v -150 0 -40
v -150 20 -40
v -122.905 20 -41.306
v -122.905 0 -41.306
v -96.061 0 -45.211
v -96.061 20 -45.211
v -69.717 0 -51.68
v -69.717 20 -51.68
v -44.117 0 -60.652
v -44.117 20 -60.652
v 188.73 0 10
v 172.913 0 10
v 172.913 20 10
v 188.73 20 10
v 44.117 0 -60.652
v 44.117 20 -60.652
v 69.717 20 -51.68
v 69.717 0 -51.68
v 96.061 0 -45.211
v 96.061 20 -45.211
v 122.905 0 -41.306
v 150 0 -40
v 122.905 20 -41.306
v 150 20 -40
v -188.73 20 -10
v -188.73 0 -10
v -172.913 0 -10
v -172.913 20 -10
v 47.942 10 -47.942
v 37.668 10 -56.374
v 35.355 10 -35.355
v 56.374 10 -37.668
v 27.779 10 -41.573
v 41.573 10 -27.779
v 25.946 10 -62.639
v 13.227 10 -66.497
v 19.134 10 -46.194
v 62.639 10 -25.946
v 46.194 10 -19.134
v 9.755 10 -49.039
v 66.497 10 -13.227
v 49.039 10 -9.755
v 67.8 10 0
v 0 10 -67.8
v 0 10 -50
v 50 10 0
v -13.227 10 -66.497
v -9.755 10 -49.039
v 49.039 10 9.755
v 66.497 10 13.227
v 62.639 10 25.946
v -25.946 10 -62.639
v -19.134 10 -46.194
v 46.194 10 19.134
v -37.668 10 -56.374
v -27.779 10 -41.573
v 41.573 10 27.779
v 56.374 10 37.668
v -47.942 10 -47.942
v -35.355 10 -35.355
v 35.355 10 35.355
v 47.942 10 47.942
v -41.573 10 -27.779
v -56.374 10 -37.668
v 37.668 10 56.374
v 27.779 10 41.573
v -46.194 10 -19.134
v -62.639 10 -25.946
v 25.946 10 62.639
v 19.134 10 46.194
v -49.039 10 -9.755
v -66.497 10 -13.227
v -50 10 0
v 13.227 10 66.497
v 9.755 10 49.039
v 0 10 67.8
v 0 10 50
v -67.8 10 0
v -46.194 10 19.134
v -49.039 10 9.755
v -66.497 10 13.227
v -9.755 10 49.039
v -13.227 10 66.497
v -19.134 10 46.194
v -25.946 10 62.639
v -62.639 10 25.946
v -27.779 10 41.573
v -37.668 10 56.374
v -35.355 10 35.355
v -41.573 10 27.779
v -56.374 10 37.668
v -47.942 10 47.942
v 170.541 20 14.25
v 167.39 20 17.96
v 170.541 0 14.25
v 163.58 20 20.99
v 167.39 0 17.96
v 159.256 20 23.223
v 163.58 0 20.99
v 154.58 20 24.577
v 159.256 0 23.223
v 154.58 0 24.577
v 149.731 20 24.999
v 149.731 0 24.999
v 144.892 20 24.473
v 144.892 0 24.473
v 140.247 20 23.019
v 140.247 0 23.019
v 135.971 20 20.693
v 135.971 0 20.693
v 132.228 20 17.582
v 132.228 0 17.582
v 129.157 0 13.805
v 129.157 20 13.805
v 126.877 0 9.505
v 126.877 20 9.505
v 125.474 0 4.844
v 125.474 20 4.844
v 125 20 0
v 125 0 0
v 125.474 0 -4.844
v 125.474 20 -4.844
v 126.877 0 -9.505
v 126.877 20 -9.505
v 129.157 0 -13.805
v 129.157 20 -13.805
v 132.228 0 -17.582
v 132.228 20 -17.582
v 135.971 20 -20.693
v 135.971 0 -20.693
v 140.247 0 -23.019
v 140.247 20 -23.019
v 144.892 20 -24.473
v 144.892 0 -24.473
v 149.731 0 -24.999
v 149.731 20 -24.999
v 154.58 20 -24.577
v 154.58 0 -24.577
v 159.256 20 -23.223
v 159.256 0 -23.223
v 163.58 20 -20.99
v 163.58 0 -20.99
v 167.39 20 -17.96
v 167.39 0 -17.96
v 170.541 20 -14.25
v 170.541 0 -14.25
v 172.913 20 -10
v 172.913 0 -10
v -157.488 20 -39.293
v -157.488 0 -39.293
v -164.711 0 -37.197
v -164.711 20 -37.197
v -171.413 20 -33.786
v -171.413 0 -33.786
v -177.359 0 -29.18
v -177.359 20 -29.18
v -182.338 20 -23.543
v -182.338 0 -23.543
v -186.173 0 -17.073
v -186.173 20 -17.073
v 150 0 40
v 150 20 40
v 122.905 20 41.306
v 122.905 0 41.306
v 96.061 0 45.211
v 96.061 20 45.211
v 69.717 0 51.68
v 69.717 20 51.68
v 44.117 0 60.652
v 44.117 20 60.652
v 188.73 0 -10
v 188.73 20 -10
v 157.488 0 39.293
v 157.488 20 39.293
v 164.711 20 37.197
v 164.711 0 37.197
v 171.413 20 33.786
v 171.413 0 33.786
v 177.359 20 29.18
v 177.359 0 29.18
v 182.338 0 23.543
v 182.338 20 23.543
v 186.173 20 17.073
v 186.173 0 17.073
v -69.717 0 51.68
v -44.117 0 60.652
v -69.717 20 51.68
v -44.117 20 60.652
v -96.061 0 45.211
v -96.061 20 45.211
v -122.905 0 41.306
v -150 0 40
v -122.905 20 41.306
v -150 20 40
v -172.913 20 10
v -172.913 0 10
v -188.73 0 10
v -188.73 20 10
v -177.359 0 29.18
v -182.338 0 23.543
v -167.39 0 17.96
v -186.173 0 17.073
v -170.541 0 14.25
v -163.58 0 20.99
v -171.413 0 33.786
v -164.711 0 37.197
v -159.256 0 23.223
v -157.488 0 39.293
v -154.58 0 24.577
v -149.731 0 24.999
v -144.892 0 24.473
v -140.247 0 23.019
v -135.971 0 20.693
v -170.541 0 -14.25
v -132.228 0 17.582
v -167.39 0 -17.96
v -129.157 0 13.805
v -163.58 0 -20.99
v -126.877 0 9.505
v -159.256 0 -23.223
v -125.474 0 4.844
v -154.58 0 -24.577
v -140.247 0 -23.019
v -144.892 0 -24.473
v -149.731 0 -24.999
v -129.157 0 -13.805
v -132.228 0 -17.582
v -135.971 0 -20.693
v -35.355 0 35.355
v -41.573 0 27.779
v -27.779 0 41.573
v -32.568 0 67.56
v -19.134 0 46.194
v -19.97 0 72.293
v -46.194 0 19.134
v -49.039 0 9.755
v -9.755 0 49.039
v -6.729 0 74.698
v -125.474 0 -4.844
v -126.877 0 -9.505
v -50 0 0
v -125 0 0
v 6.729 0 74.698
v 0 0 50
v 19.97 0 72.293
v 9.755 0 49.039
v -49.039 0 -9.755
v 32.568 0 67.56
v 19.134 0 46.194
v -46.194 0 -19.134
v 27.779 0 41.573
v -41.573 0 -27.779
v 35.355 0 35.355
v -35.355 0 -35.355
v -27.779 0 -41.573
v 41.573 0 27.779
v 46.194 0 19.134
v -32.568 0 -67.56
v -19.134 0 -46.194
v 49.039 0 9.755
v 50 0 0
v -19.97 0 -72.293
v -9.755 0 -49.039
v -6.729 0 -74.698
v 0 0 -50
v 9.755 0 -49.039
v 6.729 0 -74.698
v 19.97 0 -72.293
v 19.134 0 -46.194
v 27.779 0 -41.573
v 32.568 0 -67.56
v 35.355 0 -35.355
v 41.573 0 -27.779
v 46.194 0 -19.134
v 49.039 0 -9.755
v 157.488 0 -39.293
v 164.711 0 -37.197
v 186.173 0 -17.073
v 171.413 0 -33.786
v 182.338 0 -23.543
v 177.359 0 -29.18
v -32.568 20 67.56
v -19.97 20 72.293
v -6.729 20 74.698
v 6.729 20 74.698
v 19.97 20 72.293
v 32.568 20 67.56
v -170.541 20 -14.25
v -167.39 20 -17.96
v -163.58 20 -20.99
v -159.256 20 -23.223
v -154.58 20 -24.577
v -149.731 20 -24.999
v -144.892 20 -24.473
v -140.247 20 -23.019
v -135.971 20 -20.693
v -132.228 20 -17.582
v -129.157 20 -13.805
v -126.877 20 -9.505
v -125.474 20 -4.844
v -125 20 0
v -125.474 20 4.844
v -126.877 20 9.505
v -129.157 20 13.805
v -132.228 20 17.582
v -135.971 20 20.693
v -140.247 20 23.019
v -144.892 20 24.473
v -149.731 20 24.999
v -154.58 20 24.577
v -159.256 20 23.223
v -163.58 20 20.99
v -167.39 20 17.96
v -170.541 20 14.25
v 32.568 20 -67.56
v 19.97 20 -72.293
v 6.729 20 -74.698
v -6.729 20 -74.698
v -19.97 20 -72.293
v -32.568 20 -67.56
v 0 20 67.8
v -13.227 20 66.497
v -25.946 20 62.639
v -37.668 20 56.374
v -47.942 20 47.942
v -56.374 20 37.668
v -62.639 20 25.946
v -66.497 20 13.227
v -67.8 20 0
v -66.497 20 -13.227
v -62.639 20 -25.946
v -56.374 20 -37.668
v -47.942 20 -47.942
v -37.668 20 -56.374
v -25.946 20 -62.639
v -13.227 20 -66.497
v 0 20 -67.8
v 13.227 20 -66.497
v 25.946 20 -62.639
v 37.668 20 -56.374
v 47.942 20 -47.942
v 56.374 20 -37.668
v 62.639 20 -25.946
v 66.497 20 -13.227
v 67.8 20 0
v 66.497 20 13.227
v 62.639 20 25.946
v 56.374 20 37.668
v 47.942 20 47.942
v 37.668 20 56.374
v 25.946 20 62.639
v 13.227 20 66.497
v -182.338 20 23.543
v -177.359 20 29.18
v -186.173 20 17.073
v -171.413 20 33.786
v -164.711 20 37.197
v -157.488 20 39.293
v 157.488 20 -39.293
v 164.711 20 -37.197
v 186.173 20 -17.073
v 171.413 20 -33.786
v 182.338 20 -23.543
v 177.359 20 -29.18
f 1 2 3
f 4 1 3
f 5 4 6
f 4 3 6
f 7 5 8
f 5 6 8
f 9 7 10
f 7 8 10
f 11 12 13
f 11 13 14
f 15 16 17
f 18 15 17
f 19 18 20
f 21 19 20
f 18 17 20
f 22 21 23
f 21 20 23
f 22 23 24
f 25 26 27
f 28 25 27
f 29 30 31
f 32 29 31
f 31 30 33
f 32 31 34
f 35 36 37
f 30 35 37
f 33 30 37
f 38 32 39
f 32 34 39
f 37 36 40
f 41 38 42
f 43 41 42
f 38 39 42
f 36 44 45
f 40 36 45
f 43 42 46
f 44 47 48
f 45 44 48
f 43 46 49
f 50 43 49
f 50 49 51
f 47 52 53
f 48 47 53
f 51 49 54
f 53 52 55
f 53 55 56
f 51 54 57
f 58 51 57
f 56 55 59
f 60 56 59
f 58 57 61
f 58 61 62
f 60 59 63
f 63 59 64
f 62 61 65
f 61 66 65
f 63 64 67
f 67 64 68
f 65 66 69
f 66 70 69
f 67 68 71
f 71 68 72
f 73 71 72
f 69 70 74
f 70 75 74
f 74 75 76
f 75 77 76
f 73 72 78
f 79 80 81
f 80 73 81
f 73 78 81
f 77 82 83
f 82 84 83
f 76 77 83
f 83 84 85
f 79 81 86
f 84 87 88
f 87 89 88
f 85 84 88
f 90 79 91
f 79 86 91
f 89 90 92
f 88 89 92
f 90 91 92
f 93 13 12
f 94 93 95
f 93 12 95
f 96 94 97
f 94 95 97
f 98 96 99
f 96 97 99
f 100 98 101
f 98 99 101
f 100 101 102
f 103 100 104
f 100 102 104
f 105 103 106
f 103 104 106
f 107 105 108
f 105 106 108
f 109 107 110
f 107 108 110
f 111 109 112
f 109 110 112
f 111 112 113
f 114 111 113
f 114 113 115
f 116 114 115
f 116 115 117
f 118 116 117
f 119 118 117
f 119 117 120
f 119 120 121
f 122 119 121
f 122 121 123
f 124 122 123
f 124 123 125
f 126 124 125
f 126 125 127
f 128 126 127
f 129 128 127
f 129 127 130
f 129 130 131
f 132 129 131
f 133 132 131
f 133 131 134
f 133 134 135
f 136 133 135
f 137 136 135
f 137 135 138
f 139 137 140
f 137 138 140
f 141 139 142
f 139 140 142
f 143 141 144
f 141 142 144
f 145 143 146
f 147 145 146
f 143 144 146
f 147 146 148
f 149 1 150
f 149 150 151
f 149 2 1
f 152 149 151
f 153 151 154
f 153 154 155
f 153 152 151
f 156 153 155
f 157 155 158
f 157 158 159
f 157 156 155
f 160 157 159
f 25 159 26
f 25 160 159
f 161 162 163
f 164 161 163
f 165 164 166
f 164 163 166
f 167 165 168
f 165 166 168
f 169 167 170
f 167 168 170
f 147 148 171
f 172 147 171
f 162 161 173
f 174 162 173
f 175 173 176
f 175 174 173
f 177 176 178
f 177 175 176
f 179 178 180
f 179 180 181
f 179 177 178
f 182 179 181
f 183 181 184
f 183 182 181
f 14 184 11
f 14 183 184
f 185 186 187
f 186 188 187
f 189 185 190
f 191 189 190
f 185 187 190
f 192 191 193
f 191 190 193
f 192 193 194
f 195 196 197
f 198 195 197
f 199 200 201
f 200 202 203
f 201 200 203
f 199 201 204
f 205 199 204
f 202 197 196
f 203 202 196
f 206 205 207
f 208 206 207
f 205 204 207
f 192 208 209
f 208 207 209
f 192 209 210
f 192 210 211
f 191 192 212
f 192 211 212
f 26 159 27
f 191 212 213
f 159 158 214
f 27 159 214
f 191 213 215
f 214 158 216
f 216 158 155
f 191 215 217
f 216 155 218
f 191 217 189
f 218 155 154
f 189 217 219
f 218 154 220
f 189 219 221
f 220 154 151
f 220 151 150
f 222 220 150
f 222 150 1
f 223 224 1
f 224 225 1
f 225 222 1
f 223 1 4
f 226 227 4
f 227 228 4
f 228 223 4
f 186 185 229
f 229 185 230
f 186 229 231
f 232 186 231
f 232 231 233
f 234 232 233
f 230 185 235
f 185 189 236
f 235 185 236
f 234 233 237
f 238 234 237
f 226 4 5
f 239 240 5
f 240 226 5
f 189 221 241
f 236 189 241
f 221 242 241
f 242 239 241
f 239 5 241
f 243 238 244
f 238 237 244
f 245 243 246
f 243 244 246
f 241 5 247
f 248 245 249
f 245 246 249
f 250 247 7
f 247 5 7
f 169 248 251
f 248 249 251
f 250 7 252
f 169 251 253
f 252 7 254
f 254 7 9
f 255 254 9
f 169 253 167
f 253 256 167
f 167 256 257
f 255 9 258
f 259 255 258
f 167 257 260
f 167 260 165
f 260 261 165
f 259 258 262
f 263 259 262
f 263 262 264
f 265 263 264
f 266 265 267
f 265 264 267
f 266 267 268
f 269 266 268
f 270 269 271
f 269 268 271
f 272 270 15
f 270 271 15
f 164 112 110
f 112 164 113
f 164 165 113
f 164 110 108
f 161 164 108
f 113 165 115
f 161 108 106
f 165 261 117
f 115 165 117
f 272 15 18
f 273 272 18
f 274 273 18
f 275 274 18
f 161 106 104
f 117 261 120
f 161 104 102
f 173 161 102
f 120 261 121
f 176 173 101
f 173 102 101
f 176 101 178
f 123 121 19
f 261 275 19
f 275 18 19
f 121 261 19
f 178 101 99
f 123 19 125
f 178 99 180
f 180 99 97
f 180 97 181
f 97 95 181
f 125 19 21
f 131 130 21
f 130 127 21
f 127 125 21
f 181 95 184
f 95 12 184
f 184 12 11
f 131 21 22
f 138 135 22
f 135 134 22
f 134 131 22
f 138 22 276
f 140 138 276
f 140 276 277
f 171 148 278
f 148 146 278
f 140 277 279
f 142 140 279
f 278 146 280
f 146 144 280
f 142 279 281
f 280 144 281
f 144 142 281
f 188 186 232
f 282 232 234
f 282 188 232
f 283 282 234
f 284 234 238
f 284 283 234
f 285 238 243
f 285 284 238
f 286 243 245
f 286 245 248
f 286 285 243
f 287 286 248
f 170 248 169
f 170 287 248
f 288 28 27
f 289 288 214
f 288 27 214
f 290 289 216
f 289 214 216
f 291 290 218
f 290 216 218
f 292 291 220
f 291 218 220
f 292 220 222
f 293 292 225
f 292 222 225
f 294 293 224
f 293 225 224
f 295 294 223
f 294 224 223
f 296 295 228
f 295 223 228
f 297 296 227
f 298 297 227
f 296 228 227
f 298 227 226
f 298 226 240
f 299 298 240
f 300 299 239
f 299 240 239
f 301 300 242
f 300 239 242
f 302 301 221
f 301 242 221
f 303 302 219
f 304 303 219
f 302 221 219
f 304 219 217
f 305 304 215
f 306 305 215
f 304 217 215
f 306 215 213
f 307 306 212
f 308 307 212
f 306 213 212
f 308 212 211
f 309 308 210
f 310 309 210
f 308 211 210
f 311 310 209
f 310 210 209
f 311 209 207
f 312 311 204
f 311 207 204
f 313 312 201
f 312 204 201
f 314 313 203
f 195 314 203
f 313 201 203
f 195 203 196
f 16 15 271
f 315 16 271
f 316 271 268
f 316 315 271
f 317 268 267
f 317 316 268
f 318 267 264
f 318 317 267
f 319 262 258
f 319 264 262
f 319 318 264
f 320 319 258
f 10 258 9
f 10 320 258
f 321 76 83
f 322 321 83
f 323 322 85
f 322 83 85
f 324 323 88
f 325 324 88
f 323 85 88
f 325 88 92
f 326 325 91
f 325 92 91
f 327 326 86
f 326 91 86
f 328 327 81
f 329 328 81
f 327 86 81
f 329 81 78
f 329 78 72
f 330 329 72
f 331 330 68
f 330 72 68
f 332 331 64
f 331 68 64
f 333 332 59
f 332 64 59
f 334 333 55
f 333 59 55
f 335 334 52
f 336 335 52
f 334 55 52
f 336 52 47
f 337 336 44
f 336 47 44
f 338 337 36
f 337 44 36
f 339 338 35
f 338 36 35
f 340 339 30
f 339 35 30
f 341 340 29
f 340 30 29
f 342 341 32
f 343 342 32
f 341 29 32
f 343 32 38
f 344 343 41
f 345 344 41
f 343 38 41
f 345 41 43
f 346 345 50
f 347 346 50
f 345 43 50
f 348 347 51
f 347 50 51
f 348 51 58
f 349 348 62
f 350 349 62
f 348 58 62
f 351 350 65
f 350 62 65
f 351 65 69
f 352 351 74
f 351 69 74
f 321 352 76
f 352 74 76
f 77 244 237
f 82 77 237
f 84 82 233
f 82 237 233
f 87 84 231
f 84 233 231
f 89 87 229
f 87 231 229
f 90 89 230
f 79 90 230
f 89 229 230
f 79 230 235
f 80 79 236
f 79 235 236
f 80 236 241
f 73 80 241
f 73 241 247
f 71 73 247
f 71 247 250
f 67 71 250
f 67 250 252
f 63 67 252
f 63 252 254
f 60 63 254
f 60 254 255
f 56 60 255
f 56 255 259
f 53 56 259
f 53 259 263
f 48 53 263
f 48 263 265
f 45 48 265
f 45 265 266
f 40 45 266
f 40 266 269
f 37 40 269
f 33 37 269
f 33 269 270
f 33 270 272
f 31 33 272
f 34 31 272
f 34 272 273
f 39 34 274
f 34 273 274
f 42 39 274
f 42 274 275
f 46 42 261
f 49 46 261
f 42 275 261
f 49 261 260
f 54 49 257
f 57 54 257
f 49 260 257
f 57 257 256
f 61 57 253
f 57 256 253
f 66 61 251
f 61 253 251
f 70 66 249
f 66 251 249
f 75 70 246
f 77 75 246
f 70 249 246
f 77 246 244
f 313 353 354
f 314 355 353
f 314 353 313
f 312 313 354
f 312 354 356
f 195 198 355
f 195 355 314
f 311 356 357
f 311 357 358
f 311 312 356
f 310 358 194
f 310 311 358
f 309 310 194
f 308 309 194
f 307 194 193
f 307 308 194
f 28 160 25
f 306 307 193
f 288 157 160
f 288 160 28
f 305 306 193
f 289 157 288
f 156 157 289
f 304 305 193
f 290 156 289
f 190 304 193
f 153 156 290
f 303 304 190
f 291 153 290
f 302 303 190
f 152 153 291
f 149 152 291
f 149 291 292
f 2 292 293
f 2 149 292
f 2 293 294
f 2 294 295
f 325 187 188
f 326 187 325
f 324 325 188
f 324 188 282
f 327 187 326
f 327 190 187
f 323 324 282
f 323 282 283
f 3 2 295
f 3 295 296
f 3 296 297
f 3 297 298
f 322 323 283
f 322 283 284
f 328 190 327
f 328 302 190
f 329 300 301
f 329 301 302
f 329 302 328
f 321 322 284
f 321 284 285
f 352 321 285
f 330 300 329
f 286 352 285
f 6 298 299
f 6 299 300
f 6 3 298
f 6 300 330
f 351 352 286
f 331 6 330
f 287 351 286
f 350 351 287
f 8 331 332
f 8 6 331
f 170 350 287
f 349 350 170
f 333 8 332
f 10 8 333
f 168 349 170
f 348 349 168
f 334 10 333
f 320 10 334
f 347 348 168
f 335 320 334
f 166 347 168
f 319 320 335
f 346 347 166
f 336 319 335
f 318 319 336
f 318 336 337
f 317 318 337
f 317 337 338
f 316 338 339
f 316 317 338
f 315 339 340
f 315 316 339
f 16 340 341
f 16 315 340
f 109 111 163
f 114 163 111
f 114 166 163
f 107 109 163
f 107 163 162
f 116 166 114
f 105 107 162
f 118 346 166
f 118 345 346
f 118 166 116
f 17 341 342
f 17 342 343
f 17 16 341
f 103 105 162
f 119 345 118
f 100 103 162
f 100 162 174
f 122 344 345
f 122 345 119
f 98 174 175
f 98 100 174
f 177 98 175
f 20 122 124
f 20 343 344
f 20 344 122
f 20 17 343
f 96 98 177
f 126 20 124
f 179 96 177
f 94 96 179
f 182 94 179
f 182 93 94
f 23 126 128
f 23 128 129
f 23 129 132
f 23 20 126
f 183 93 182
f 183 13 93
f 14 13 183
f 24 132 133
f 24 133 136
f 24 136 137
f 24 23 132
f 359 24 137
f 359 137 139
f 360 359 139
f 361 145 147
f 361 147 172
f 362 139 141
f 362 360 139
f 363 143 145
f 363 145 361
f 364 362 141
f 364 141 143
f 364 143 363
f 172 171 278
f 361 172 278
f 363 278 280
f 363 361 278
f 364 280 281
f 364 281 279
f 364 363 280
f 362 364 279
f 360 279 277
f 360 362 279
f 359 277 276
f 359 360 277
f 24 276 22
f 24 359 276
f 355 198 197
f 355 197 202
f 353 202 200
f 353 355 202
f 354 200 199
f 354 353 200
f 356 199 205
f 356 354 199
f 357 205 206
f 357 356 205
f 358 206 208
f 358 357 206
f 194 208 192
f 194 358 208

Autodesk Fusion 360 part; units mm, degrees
sketch "Sketch1" plane through (0, 0, 0) normal (0, 1, 0) x (1, 0, 0)
  line L0 (190, -75) -> (-190, -75)
  line L1 (-190, -75) -> (-190, 75)
  line L2 (-190, 75) -> (190, 75)
  line L3 (190, 75) -> (190, -75)
  line L4 (190, -75) -> (-190, 75) construction
  line L5 (-190, -75) -> (190, 75) construction
  dimension "d1" = 380
  dimension "d2" = 150
extrude "Extrude1" add sketch "Sketch1" along normal blind 20
sketch "Sketch2" plane through (0, 20, 0) normal (0, 1, 0) x (-1, 0, 0)
  line L0 (-190, -75) -> (190, -75)
  line L1 (190, -75) -> (190, 75)
  line L2 (190, 75) -> (-190, 75)
  line L3 (-190, 75) -> (-190, -75)
  circle A0 centre (0, 0) radius 75
  line L4 (0, 0) -> (-150, 0)
  line L5 (0, 0) -> (150, 0)
  circle A1 centre (150, 0) radius 40
  circle A2 centre (-150, 0) radius 40
  line L6 (190, 0) -> (175, 0)
  line L7 (175, 0) -> (175, -10)
  line L8 (175, -10) -> (188.7298, -10)
  line L9 (175, 0) -> (175, 10)
  line L10 (175, 10) -> (188.7298, 10)
  line L11 (-190, 0) -> (-175, 0)
  line L12 (-175, 0) -> (-175, -10)
  line L13 (-175, 0) -> (-175, 10)
  line L14 (-175, -10) -> (-188.7298, -10)
  line L15 (-175, 10) -> (-188.7298, 10)
  line L16 (-188.7298, -10) -> (-190, -10)
  line L17 (-188.7298, 10) -> (-190, 10)
  line L18 (188.7298, -10) -> (190, -10)
  line L19 (188.7298, 10) -> (190, 10)
  circle A3 centre (150, 0) radius 25
  line L20 (175, -10) -> (172.9129, -10)
  line L21 (172.9129, 10) -> (175, 10)
  line L22 (172.9129, 10) -> (172.9129, -10)
  circle A4 centre (-150, 0) radius 25
  line L23 (-175, -10) -> (-172.9129, -10)
  line L24 (-172.9129, -10) -> (-172.9129, 10)
  line L25 (-172.9129, 10) -> (-175, 10)
  line L26 (-190, 10) -> (-190, -10)
  line L27 (-188.7298, -10) -> (-190, -10)
  line L28 (-188.7298, 10) -> (-190, 10)
  line L29 (0, -75) -> (-190, -75)
  line L30 (0, -75) -> (0, 75)
  line L31 (-190, 75) -> (-190, -75)
  line L32 (-150, 0) -> (-150, -75)
  line L33 (-150, 0) -> (-150, 75)
  line L34 (0, 75) -> (-150, 75)
  line L35 (150, 0) -> (150, 75)
  line L36 (0, 75) -> (150, 75)
  line L37 (150, 0) -> (150, -75)
  line L38 (150, -75) -> (0, -75)
  arc A5 (150, -40) -> (44.1171, -60.6521) centre (150, -321.7554) ccw
  arc A6 (-44.1171, -60.6521) -> (-150, -40) centre (-150, -321.7554) ccw
  arc A7 (-150, 40) -> (-44.1171, 60.6521) centre (-150, 321.7554) ccw
  arc A8 (44.1171, 60.6521) -> (150, 40) centre (150, 321.7554) ccw
  dimension "d5" = 150
  dimension "d6" = 150
  dimension "d7" = 80
  dimension "d19" = 15
  dimension "d20" = 10
  dimension "d21" = 10
  dimension "d22" = 15
  dimension "d23" = 10
  dimension "d24" = 10
hole "Hole1" at (0, 20, 0) direction (0, -1, 0) diameter 100 depth 20 tip angle 180 counterbore diameter 135.6 counterbore depth 10
hole "Hole2" at (-150, 20, 0) direction (0, -1, 0) diameter 50 depth 20 tip angle 180
hole "Hole3" at (150, 20, 0) direction (0, -1, 0) diameter 50 depth 20 tip angle 180
extrude "Extrude2" cut sketch "Sketch2" against normal blind 20 contours A2 L11 L12 L14 | A2 L11 L13 L15 | A1 L6 L7 L8 | A1 L6 L9 L10
extrude "Extrude3" cut sketch "Sketch2" against normal blind 20 contours L1 A1 L18 | L1 A1 L19
extrude "Extrude4" cut sketch "Sketch2" against normal blind 20 contours L7 A3 L20 | L9 A3 L21
extrude "Extrude5" cut sketch "Sketch2" against normal blind 20 contours L12 A4 L23 | L13 A4 L25
extrude "Extrude6" cut sketch "Sketch2" against normal blind 20 contours L3 A2 L16 L26 L27 L31 | L3 A2 L17 L26 L28 L31
extrude "Extrude7" cut sketch "Sketch2" against normal blind 20 contours L0 L3 A2 L16 L27 L29 L31 L32 | L0 A0 L29 L32 A6 | L0 A0 L37 L38 A5 | L0 L1 A1 L18 L37 | L2 L3 A2 L17 L28 L31 L33 | L2 A0 L33 L34 A7 | L2 A0 L35 L36 A8 | L1 L2 A1 L19 L35
